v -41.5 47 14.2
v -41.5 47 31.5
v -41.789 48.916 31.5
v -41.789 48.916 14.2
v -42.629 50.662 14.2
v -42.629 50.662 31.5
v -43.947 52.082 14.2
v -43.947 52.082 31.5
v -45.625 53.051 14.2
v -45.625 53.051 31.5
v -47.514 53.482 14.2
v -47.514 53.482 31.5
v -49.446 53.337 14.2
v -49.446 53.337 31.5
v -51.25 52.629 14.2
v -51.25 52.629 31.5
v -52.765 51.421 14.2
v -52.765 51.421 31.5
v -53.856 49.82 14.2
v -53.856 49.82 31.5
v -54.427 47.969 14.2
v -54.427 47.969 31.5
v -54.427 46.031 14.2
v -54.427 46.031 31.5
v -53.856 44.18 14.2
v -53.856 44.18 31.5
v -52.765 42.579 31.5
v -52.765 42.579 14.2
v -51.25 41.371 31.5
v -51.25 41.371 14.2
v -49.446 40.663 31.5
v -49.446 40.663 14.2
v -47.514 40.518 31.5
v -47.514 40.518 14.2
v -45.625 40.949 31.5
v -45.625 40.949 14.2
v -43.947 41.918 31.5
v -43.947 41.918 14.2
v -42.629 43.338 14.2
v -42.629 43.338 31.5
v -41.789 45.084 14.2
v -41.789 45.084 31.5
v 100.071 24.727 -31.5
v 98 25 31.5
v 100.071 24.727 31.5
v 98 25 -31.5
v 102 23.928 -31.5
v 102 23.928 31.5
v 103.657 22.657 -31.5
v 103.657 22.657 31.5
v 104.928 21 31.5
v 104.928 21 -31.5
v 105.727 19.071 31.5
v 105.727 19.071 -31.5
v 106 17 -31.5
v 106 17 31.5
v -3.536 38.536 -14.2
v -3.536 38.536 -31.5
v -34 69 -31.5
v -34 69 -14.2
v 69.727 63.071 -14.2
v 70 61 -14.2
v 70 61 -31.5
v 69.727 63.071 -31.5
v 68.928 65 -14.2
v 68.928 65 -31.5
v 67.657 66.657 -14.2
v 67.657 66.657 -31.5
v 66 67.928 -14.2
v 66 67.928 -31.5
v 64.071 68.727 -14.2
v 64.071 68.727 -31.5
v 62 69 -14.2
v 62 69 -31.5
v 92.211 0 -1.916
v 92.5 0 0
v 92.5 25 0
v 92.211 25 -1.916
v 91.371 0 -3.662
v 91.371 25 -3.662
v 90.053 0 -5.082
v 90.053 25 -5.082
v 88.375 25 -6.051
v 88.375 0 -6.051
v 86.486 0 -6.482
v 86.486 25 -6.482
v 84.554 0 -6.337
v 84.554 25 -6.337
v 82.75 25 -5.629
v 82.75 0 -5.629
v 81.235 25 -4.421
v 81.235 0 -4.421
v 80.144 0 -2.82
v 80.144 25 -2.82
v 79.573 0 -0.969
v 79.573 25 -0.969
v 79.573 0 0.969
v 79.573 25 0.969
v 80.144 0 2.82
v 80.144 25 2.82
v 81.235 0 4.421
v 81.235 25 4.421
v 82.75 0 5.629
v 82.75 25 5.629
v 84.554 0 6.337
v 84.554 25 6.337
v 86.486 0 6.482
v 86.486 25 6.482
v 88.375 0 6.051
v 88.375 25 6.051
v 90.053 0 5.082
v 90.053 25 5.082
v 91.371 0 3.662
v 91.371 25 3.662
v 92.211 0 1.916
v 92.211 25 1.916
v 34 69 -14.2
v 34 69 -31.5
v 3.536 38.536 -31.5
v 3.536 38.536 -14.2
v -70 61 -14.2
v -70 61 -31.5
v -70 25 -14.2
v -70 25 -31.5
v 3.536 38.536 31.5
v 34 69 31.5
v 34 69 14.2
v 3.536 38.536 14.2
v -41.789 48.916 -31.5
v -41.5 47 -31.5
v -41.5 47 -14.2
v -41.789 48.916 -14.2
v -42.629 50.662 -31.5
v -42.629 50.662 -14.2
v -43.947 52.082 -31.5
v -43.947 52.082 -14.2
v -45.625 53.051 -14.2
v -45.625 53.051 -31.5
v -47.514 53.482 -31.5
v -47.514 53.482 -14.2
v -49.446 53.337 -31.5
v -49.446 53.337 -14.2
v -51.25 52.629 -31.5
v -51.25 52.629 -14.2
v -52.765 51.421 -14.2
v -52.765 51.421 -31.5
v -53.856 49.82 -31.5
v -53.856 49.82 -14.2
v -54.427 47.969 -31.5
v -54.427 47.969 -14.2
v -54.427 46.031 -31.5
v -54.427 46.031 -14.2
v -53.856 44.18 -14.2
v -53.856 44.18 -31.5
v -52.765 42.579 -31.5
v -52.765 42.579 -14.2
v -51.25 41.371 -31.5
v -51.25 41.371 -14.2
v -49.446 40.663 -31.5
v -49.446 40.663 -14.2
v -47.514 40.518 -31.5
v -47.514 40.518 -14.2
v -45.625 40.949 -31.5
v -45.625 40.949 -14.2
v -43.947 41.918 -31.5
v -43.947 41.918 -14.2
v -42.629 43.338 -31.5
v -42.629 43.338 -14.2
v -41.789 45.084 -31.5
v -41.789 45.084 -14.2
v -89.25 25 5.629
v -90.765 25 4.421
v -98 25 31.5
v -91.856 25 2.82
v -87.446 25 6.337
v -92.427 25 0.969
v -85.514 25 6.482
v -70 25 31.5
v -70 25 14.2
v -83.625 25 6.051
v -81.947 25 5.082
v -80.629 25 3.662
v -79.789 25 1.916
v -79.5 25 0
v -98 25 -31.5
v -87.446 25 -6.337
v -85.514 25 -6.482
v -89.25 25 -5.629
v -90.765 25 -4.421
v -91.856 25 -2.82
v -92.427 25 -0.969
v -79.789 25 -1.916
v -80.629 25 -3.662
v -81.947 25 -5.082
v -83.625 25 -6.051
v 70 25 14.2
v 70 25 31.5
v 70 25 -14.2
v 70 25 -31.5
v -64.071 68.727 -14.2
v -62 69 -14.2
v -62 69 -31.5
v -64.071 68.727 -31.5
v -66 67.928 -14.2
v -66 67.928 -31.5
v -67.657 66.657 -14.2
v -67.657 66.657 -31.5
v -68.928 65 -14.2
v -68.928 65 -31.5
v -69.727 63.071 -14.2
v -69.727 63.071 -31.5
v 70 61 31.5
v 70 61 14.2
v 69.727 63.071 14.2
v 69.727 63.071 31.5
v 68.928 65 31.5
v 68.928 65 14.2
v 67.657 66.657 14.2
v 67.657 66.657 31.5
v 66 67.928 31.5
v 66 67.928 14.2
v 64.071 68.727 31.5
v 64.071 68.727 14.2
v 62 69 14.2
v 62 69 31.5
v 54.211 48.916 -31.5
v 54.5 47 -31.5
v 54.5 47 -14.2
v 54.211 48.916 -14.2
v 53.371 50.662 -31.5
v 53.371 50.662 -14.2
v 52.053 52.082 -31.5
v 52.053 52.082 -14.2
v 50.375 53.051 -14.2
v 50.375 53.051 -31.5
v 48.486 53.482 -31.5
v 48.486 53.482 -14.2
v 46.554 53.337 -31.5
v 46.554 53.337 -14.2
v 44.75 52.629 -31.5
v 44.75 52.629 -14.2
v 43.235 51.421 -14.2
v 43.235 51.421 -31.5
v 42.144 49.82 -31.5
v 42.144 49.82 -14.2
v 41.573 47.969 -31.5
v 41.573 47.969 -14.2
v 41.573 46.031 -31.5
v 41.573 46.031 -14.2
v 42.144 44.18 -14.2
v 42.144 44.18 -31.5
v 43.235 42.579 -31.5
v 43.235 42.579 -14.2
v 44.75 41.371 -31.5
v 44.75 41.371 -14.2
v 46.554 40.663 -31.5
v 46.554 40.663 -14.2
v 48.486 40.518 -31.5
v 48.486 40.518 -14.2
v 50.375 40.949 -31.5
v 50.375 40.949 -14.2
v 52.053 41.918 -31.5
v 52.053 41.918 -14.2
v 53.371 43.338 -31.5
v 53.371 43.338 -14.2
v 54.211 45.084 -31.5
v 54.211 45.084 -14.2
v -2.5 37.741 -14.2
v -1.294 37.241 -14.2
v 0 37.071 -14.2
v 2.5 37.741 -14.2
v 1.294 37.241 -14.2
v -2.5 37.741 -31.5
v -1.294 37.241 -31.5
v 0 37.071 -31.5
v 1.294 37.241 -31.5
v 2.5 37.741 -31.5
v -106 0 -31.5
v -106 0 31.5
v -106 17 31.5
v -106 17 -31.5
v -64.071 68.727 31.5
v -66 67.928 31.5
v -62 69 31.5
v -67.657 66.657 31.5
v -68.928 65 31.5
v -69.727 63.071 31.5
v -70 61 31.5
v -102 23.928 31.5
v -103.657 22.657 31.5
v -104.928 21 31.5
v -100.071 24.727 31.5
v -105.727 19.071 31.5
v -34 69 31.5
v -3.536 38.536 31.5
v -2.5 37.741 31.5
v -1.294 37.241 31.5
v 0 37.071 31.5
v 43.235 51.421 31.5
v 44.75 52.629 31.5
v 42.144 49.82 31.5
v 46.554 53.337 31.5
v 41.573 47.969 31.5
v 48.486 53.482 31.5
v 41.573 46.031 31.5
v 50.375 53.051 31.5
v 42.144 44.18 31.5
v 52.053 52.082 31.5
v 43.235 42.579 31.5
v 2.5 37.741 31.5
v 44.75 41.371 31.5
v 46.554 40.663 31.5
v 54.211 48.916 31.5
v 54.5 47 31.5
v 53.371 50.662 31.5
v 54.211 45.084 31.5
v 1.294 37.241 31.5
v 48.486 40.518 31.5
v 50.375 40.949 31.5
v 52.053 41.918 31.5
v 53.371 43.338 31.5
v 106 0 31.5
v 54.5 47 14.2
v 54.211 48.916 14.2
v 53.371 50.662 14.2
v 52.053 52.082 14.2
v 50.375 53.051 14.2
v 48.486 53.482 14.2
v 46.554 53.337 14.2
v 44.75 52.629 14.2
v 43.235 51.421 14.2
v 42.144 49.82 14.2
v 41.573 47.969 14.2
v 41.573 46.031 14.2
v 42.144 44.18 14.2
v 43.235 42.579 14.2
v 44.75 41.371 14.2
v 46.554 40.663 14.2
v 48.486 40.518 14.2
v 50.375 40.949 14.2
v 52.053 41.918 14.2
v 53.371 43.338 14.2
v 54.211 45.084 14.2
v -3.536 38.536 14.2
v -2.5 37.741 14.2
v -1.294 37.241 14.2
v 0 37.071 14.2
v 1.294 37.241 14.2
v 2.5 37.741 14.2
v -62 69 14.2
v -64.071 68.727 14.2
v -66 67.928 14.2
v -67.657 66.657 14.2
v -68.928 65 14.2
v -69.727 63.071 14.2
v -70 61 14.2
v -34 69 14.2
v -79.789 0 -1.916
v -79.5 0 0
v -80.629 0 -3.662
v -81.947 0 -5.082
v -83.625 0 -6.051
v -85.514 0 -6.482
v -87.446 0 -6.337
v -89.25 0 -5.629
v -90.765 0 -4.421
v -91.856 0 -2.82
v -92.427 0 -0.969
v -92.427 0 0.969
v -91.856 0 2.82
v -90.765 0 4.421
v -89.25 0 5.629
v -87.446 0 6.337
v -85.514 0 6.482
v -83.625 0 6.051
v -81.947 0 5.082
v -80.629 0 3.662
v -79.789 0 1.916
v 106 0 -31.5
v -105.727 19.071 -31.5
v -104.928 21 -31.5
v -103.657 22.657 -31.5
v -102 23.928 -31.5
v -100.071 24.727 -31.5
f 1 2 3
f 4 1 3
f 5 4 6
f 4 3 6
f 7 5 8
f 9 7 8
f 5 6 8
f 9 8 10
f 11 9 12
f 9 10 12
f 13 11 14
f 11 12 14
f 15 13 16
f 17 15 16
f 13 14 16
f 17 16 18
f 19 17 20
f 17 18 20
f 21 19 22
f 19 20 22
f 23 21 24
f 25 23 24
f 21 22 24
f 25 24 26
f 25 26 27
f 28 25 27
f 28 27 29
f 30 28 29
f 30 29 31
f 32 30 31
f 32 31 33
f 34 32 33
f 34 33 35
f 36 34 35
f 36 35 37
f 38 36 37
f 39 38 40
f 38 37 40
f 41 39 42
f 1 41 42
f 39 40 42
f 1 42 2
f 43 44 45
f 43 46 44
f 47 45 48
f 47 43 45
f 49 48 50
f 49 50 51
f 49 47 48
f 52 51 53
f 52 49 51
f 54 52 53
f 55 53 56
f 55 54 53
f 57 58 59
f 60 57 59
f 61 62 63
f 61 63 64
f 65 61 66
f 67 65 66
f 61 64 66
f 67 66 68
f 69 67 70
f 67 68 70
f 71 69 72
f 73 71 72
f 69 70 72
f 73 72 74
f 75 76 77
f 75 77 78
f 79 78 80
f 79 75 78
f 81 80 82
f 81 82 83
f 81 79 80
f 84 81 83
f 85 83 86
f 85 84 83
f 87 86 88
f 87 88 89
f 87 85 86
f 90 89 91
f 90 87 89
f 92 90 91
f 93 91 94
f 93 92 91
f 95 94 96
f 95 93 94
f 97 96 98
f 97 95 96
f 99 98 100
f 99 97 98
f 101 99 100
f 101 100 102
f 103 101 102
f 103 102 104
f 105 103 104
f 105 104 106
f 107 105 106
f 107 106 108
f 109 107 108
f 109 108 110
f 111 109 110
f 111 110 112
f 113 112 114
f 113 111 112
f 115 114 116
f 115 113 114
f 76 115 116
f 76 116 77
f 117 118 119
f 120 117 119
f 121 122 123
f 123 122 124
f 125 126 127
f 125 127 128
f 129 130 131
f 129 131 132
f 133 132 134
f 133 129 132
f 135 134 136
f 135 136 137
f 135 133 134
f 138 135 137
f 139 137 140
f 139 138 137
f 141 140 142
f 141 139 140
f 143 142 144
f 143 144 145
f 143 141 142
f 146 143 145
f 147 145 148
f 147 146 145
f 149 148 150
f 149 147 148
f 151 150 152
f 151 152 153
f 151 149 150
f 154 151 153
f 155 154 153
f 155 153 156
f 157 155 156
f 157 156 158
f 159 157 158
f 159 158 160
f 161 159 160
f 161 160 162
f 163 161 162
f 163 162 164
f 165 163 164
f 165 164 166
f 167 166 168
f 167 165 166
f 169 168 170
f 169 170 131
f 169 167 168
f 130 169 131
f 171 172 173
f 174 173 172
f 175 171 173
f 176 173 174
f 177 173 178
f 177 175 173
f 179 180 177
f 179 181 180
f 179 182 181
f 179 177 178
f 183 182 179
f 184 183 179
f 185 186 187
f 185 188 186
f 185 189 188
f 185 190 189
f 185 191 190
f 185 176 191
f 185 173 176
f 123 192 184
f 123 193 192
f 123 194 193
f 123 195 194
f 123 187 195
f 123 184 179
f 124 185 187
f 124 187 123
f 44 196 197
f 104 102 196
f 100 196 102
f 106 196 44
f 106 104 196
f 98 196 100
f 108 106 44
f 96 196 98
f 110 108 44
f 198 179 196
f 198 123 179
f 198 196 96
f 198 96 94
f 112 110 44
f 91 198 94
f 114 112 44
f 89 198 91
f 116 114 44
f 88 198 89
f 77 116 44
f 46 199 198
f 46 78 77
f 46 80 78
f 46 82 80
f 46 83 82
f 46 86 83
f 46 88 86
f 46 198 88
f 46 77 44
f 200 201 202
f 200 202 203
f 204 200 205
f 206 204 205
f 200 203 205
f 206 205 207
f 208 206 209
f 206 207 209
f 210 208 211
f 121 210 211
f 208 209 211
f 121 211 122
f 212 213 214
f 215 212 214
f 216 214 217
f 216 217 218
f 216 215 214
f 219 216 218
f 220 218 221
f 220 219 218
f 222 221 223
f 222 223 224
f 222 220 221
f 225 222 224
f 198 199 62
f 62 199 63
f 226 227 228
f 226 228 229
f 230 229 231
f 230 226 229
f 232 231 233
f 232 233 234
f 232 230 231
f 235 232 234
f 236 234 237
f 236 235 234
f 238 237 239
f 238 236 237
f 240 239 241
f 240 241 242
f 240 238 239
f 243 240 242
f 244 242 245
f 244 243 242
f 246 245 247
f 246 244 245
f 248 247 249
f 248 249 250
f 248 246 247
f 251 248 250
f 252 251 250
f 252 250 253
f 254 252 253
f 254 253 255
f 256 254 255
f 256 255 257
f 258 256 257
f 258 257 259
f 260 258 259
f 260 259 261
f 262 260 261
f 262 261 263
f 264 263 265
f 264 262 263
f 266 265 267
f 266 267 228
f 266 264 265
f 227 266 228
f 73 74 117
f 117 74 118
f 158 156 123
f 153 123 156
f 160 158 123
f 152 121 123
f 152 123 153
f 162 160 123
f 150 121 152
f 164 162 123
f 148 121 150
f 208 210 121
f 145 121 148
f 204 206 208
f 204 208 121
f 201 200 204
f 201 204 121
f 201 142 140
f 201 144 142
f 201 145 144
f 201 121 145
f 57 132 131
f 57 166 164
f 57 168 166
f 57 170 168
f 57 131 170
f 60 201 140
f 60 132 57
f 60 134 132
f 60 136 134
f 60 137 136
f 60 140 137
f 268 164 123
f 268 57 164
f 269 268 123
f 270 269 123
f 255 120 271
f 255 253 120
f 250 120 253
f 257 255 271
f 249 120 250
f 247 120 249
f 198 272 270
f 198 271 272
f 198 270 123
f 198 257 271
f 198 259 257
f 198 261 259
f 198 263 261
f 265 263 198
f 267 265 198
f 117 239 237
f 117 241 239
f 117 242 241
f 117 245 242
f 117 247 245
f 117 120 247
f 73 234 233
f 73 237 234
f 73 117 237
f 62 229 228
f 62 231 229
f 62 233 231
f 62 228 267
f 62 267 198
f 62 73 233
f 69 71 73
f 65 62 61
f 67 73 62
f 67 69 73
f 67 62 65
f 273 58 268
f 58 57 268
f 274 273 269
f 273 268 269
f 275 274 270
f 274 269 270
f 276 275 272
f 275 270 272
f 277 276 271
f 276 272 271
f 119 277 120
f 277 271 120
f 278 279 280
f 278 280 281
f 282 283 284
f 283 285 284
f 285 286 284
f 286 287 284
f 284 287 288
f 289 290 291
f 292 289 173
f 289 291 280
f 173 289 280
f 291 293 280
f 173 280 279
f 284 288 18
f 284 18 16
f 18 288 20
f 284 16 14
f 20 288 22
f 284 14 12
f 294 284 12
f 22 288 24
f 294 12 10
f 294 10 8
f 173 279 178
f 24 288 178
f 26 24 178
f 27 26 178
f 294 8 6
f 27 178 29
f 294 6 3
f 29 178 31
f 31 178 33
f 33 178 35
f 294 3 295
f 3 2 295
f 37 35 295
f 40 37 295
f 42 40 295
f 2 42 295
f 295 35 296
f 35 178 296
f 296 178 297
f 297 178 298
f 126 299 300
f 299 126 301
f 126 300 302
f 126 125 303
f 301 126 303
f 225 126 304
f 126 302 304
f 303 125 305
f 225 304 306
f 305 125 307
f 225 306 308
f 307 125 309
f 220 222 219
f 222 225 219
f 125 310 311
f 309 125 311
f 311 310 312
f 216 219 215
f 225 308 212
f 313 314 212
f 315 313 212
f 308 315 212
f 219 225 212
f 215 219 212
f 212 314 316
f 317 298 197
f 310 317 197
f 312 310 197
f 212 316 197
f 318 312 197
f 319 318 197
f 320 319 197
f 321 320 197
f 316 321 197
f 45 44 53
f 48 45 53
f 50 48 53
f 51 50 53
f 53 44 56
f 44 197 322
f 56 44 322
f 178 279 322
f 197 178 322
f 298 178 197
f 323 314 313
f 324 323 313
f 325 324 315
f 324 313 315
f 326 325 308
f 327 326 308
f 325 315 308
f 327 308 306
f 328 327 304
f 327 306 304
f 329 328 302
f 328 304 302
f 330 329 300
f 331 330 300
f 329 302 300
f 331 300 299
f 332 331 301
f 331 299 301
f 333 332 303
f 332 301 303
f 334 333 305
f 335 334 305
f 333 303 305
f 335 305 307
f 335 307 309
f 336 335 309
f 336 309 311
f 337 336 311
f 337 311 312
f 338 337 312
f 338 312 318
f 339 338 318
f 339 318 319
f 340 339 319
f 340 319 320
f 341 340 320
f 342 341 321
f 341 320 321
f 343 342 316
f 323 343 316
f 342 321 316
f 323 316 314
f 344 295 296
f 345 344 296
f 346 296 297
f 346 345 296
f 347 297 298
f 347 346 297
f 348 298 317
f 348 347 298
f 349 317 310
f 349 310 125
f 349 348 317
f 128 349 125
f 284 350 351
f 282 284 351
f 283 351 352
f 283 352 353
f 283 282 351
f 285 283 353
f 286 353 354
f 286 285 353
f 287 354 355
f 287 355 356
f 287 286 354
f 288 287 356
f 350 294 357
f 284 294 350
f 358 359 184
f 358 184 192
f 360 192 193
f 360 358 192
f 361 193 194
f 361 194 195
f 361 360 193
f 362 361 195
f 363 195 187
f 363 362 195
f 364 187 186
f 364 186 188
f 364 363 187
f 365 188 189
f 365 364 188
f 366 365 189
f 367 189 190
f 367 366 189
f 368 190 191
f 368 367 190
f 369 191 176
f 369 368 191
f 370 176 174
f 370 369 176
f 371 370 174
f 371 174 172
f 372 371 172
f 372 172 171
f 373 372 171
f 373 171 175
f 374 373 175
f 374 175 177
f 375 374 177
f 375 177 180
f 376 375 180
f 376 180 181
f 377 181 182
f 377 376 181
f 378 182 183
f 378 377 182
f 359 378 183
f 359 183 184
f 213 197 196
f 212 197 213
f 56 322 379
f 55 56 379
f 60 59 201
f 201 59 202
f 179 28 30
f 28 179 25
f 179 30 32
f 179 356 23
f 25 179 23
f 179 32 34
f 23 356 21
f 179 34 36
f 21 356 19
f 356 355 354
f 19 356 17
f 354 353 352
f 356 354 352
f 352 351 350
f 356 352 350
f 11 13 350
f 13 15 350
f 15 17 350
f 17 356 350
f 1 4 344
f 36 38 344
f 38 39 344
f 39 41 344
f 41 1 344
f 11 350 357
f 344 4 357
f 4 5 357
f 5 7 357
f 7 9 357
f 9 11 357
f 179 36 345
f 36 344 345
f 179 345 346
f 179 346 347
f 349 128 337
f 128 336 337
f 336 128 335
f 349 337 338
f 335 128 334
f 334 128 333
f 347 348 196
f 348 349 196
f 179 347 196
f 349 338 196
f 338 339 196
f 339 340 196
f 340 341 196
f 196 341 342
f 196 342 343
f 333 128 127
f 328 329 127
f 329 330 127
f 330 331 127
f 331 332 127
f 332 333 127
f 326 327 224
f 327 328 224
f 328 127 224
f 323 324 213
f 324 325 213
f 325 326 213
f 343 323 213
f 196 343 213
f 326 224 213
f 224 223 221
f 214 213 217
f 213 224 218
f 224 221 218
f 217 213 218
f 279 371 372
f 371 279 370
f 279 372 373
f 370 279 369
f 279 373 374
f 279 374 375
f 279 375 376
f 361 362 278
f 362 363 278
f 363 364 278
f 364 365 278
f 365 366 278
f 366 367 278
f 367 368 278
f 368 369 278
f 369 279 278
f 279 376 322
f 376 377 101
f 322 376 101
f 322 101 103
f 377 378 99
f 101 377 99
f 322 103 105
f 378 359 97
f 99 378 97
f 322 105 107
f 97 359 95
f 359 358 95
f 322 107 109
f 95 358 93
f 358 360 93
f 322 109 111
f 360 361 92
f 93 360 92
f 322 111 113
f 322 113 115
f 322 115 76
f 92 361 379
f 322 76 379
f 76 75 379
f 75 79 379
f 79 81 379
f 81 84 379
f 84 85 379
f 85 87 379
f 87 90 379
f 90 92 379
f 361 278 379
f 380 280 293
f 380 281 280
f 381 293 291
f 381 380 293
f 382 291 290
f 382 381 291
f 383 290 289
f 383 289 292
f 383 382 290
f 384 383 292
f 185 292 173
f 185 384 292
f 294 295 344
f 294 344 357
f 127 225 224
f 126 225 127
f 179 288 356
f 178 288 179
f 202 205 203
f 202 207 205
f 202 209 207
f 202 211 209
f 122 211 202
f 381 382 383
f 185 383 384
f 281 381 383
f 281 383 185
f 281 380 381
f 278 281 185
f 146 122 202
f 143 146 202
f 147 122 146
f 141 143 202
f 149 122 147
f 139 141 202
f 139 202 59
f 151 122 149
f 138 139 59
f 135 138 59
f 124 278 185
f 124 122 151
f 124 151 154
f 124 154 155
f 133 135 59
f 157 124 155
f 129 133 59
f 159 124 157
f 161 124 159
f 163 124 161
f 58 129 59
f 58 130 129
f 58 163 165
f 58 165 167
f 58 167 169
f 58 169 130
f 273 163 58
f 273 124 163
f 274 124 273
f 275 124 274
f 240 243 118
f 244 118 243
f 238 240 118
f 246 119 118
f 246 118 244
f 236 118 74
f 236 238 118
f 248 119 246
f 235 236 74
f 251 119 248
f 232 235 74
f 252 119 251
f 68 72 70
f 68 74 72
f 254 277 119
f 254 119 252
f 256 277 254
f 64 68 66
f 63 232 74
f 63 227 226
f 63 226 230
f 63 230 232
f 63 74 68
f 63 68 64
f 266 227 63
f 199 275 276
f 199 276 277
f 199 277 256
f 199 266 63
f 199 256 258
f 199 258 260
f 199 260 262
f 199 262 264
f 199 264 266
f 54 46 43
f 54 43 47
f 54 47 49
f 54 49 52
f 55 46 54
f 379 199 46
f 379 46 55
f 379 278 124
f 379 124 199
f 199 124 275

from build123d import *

# Parameters (mm, degrees)
SKETCH1_W           = 212
SKETCH1_H           = 63
SKETCH1_R           = 6.5
BOSS_EXTRUDE1_DEPTH = 25
SKETCH2_R           = 6.5
BOSS_EXTRUDE2_DEPTH = 17.3
FILLET1_R           = 8
FILLET2_R           = 5


with BuildPart() as part:
    # Sketch1 → Boss-Extrude1 (new body)
    with BuildSketch(Plane(origin=(0, 0, 0), x_dir=(1, 0, 0), z_dir=(0, 1, 0))):
        Rectangle(SKETCH1_W, SKETCH1_H)
        with Locations((86, 0)):
            Circle(SKETCH1_R, mode=Mode.SUBTRACT)
        with Locations((-86, 0)):
            Circle(SKETCH1_R, mode=Mode.SUBTRACT)
    extrude(amount=BOSS_EXTRUDE1_DEPTH)

    # Sketch2 → Boss-Extrude2 (add)
    with BuildSketch(Plane.XY.offset(31.5)):
        with BuildLine():
            Line((-70, 25), (70, 25))
            Line((70, 25), (70, 61))
            ThreePointArc((70, 61), (67.656854249, 66.656854249), (62, 69))
            Line((62, 69), (34, 69))
            Line((34, 69), (0, 35))
            Line((0, 35), (-34, 69))
            Line((-34, 69), (-62, 69))
            ThreePointArc((-62, 69), (-67.656854249, 66.656854249), (-70, 61))
            Line((-70, 61), (-70, 25))
        make_face()
        with Locations((-48, 47)):
            Circle(SKETCH2_R, mode=Mode.SUBTRACT)
        with Locations((48, 47)):
            Circle(SKETCH2_R, mode=Mode.SUBTRACT)
    boss_extrude2 = extrude(amount=-BOSS_EXTRUDE2_DEPTH)

    # Mirror1: Boss-Extrude2 across plane
    add(boss_extrude2.mirror(Plane.XY))

    # Fillet1
    fillet1_edges = [part.edges().sort_by_distance(p)[0] for p in [
        (-106, 25, 0),
        (106, 25, 0),
    ]]
    fillet(fillet1_edges, radius=FILLET1_R)

    # Fillet2
    fillet2_edges = [part.edges().sort_by_distance(p)[0] for p in [
        (0, 35, 22.85),
        (0, 35, -22.85),
    ]]
    fillet(fillet2_edges, radius=FILLET2_R)


solid = part.part
